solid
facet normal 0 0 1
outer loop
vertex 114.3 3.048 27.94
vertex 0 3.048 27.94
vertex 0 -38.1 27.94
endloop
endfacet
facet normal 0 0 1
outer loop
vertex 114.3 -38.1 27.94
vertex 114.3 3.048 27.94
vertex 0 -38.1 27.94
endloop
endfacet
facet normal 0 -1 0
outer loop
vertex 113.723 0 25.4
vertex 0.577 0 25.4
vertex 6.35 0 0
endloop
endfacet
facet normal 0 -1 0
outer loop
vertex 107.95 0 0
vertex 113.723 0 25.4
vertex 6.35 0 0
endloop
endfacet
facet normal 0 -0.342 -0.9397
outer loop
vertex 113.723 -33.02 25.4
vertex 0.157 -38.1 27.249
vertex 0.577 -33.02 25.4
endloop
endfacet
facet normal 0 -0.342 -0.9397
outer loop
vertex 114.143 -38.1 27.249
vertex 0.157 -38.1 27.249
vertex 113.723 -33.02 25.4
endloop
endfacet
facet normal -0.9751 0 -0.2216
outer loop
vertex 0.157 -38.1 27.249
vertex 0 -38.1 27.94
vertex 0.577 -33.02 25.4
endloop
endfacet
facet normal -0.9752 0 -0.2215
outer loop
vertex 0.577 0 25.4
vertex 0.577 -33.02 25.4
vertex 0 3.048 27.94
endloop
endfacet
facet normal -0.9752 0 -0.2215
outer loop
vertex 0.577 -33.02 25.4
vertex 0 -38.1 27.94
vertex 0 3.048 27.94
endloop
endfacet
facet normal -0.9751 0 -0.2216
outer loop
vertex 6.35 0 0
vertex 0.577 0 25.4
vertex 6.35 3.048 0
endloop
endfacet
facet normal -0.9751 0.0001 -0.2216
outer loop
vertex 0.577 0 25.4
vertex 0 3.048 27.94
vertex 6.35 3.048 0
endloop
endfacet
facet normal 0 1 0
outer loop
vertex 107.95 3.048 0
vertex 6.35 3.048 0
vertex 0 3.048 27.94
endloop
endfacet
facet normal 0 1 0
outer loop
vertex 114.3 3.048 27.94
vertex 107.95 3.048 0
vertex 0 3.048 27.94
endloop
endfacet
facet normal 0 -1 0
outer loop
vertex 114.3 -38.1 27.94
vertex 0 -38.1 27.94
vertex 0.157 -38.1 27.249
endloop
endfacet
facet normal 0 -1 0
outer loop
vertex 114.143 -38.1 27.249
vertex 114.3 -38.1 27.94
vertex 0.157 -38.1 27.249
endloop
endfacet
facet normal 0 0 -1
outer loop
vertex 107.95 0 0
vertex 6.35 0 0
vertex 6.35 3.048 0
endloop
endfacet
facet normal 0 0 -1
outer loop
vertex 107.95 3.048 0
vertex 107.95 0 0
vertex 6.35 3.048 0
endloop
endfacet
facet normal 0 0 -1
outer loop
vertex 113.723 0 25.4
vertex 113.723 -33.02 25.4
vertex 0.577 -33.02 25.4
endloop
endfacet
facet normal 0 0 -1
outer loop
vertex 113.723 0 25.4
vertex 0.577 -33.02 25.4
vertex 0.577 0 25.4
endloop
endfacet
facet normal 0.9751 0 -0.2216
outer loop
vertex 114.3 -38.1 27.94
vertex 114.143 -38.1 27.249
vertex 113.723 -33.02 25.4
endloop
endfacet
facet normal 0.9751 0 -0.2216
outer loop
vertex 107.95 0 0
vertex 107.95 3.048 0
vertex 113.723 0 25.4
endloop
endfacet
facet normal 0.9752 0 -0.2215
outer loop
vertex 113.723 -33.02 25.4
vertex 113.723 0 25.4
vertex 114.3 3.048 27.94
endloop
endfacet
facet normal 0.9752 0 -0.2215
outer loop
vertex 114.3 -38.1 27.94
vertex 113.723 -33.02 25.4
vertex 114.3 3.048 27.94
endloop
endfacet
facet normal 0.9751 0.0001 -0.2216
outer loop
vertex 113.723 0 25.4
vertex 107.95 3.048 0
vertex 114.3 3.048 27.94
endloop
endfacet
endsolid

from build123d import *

# Parameters (mm, degrees)
F1_DEPTH = 114.3
F3_DEPTH = 41.149
F4_SIZE2 = 1.848969
F4_SIZE  = 5.08


with BuildPart() as f1:
    # F0 (on Right) → F1 (new body)
    with BuildSketch(Plane.YZ):
        Polygon((0, 25.4), (0, 0), (3.048, 0), (3.048, 27.94), (-38.1, 27.94), (-38.1, 25.4), align=None)
    extrude(amount=F1_DEPTH)

    # F2 (on face) → F3 (cut, through all)
    with BuildSketch(Plane(origin=(0, 3.048, 0), x_dir=(-1, 0, 0), z_dir=(0, 1, 0))):
        Polygon((-107.95, 0), (-114.3, 27.94), (-114.3, 0), align=None)
        Polygon((0, 0), (0, 27.94), (-6.35, 0), align=None)
    extrude(amount=-F3_DEPTH, mode=Mode.SUBTRACT)

    # F4
    f4_edges = [f1.edges().sort_by_distance(p)[0] for p in [
        (57.15, -38.1, 25.4),
    ]]
    chamfer(f4_edges, length=F4_SIZE, length2=F4_SIZE2)


solid = f1.part
